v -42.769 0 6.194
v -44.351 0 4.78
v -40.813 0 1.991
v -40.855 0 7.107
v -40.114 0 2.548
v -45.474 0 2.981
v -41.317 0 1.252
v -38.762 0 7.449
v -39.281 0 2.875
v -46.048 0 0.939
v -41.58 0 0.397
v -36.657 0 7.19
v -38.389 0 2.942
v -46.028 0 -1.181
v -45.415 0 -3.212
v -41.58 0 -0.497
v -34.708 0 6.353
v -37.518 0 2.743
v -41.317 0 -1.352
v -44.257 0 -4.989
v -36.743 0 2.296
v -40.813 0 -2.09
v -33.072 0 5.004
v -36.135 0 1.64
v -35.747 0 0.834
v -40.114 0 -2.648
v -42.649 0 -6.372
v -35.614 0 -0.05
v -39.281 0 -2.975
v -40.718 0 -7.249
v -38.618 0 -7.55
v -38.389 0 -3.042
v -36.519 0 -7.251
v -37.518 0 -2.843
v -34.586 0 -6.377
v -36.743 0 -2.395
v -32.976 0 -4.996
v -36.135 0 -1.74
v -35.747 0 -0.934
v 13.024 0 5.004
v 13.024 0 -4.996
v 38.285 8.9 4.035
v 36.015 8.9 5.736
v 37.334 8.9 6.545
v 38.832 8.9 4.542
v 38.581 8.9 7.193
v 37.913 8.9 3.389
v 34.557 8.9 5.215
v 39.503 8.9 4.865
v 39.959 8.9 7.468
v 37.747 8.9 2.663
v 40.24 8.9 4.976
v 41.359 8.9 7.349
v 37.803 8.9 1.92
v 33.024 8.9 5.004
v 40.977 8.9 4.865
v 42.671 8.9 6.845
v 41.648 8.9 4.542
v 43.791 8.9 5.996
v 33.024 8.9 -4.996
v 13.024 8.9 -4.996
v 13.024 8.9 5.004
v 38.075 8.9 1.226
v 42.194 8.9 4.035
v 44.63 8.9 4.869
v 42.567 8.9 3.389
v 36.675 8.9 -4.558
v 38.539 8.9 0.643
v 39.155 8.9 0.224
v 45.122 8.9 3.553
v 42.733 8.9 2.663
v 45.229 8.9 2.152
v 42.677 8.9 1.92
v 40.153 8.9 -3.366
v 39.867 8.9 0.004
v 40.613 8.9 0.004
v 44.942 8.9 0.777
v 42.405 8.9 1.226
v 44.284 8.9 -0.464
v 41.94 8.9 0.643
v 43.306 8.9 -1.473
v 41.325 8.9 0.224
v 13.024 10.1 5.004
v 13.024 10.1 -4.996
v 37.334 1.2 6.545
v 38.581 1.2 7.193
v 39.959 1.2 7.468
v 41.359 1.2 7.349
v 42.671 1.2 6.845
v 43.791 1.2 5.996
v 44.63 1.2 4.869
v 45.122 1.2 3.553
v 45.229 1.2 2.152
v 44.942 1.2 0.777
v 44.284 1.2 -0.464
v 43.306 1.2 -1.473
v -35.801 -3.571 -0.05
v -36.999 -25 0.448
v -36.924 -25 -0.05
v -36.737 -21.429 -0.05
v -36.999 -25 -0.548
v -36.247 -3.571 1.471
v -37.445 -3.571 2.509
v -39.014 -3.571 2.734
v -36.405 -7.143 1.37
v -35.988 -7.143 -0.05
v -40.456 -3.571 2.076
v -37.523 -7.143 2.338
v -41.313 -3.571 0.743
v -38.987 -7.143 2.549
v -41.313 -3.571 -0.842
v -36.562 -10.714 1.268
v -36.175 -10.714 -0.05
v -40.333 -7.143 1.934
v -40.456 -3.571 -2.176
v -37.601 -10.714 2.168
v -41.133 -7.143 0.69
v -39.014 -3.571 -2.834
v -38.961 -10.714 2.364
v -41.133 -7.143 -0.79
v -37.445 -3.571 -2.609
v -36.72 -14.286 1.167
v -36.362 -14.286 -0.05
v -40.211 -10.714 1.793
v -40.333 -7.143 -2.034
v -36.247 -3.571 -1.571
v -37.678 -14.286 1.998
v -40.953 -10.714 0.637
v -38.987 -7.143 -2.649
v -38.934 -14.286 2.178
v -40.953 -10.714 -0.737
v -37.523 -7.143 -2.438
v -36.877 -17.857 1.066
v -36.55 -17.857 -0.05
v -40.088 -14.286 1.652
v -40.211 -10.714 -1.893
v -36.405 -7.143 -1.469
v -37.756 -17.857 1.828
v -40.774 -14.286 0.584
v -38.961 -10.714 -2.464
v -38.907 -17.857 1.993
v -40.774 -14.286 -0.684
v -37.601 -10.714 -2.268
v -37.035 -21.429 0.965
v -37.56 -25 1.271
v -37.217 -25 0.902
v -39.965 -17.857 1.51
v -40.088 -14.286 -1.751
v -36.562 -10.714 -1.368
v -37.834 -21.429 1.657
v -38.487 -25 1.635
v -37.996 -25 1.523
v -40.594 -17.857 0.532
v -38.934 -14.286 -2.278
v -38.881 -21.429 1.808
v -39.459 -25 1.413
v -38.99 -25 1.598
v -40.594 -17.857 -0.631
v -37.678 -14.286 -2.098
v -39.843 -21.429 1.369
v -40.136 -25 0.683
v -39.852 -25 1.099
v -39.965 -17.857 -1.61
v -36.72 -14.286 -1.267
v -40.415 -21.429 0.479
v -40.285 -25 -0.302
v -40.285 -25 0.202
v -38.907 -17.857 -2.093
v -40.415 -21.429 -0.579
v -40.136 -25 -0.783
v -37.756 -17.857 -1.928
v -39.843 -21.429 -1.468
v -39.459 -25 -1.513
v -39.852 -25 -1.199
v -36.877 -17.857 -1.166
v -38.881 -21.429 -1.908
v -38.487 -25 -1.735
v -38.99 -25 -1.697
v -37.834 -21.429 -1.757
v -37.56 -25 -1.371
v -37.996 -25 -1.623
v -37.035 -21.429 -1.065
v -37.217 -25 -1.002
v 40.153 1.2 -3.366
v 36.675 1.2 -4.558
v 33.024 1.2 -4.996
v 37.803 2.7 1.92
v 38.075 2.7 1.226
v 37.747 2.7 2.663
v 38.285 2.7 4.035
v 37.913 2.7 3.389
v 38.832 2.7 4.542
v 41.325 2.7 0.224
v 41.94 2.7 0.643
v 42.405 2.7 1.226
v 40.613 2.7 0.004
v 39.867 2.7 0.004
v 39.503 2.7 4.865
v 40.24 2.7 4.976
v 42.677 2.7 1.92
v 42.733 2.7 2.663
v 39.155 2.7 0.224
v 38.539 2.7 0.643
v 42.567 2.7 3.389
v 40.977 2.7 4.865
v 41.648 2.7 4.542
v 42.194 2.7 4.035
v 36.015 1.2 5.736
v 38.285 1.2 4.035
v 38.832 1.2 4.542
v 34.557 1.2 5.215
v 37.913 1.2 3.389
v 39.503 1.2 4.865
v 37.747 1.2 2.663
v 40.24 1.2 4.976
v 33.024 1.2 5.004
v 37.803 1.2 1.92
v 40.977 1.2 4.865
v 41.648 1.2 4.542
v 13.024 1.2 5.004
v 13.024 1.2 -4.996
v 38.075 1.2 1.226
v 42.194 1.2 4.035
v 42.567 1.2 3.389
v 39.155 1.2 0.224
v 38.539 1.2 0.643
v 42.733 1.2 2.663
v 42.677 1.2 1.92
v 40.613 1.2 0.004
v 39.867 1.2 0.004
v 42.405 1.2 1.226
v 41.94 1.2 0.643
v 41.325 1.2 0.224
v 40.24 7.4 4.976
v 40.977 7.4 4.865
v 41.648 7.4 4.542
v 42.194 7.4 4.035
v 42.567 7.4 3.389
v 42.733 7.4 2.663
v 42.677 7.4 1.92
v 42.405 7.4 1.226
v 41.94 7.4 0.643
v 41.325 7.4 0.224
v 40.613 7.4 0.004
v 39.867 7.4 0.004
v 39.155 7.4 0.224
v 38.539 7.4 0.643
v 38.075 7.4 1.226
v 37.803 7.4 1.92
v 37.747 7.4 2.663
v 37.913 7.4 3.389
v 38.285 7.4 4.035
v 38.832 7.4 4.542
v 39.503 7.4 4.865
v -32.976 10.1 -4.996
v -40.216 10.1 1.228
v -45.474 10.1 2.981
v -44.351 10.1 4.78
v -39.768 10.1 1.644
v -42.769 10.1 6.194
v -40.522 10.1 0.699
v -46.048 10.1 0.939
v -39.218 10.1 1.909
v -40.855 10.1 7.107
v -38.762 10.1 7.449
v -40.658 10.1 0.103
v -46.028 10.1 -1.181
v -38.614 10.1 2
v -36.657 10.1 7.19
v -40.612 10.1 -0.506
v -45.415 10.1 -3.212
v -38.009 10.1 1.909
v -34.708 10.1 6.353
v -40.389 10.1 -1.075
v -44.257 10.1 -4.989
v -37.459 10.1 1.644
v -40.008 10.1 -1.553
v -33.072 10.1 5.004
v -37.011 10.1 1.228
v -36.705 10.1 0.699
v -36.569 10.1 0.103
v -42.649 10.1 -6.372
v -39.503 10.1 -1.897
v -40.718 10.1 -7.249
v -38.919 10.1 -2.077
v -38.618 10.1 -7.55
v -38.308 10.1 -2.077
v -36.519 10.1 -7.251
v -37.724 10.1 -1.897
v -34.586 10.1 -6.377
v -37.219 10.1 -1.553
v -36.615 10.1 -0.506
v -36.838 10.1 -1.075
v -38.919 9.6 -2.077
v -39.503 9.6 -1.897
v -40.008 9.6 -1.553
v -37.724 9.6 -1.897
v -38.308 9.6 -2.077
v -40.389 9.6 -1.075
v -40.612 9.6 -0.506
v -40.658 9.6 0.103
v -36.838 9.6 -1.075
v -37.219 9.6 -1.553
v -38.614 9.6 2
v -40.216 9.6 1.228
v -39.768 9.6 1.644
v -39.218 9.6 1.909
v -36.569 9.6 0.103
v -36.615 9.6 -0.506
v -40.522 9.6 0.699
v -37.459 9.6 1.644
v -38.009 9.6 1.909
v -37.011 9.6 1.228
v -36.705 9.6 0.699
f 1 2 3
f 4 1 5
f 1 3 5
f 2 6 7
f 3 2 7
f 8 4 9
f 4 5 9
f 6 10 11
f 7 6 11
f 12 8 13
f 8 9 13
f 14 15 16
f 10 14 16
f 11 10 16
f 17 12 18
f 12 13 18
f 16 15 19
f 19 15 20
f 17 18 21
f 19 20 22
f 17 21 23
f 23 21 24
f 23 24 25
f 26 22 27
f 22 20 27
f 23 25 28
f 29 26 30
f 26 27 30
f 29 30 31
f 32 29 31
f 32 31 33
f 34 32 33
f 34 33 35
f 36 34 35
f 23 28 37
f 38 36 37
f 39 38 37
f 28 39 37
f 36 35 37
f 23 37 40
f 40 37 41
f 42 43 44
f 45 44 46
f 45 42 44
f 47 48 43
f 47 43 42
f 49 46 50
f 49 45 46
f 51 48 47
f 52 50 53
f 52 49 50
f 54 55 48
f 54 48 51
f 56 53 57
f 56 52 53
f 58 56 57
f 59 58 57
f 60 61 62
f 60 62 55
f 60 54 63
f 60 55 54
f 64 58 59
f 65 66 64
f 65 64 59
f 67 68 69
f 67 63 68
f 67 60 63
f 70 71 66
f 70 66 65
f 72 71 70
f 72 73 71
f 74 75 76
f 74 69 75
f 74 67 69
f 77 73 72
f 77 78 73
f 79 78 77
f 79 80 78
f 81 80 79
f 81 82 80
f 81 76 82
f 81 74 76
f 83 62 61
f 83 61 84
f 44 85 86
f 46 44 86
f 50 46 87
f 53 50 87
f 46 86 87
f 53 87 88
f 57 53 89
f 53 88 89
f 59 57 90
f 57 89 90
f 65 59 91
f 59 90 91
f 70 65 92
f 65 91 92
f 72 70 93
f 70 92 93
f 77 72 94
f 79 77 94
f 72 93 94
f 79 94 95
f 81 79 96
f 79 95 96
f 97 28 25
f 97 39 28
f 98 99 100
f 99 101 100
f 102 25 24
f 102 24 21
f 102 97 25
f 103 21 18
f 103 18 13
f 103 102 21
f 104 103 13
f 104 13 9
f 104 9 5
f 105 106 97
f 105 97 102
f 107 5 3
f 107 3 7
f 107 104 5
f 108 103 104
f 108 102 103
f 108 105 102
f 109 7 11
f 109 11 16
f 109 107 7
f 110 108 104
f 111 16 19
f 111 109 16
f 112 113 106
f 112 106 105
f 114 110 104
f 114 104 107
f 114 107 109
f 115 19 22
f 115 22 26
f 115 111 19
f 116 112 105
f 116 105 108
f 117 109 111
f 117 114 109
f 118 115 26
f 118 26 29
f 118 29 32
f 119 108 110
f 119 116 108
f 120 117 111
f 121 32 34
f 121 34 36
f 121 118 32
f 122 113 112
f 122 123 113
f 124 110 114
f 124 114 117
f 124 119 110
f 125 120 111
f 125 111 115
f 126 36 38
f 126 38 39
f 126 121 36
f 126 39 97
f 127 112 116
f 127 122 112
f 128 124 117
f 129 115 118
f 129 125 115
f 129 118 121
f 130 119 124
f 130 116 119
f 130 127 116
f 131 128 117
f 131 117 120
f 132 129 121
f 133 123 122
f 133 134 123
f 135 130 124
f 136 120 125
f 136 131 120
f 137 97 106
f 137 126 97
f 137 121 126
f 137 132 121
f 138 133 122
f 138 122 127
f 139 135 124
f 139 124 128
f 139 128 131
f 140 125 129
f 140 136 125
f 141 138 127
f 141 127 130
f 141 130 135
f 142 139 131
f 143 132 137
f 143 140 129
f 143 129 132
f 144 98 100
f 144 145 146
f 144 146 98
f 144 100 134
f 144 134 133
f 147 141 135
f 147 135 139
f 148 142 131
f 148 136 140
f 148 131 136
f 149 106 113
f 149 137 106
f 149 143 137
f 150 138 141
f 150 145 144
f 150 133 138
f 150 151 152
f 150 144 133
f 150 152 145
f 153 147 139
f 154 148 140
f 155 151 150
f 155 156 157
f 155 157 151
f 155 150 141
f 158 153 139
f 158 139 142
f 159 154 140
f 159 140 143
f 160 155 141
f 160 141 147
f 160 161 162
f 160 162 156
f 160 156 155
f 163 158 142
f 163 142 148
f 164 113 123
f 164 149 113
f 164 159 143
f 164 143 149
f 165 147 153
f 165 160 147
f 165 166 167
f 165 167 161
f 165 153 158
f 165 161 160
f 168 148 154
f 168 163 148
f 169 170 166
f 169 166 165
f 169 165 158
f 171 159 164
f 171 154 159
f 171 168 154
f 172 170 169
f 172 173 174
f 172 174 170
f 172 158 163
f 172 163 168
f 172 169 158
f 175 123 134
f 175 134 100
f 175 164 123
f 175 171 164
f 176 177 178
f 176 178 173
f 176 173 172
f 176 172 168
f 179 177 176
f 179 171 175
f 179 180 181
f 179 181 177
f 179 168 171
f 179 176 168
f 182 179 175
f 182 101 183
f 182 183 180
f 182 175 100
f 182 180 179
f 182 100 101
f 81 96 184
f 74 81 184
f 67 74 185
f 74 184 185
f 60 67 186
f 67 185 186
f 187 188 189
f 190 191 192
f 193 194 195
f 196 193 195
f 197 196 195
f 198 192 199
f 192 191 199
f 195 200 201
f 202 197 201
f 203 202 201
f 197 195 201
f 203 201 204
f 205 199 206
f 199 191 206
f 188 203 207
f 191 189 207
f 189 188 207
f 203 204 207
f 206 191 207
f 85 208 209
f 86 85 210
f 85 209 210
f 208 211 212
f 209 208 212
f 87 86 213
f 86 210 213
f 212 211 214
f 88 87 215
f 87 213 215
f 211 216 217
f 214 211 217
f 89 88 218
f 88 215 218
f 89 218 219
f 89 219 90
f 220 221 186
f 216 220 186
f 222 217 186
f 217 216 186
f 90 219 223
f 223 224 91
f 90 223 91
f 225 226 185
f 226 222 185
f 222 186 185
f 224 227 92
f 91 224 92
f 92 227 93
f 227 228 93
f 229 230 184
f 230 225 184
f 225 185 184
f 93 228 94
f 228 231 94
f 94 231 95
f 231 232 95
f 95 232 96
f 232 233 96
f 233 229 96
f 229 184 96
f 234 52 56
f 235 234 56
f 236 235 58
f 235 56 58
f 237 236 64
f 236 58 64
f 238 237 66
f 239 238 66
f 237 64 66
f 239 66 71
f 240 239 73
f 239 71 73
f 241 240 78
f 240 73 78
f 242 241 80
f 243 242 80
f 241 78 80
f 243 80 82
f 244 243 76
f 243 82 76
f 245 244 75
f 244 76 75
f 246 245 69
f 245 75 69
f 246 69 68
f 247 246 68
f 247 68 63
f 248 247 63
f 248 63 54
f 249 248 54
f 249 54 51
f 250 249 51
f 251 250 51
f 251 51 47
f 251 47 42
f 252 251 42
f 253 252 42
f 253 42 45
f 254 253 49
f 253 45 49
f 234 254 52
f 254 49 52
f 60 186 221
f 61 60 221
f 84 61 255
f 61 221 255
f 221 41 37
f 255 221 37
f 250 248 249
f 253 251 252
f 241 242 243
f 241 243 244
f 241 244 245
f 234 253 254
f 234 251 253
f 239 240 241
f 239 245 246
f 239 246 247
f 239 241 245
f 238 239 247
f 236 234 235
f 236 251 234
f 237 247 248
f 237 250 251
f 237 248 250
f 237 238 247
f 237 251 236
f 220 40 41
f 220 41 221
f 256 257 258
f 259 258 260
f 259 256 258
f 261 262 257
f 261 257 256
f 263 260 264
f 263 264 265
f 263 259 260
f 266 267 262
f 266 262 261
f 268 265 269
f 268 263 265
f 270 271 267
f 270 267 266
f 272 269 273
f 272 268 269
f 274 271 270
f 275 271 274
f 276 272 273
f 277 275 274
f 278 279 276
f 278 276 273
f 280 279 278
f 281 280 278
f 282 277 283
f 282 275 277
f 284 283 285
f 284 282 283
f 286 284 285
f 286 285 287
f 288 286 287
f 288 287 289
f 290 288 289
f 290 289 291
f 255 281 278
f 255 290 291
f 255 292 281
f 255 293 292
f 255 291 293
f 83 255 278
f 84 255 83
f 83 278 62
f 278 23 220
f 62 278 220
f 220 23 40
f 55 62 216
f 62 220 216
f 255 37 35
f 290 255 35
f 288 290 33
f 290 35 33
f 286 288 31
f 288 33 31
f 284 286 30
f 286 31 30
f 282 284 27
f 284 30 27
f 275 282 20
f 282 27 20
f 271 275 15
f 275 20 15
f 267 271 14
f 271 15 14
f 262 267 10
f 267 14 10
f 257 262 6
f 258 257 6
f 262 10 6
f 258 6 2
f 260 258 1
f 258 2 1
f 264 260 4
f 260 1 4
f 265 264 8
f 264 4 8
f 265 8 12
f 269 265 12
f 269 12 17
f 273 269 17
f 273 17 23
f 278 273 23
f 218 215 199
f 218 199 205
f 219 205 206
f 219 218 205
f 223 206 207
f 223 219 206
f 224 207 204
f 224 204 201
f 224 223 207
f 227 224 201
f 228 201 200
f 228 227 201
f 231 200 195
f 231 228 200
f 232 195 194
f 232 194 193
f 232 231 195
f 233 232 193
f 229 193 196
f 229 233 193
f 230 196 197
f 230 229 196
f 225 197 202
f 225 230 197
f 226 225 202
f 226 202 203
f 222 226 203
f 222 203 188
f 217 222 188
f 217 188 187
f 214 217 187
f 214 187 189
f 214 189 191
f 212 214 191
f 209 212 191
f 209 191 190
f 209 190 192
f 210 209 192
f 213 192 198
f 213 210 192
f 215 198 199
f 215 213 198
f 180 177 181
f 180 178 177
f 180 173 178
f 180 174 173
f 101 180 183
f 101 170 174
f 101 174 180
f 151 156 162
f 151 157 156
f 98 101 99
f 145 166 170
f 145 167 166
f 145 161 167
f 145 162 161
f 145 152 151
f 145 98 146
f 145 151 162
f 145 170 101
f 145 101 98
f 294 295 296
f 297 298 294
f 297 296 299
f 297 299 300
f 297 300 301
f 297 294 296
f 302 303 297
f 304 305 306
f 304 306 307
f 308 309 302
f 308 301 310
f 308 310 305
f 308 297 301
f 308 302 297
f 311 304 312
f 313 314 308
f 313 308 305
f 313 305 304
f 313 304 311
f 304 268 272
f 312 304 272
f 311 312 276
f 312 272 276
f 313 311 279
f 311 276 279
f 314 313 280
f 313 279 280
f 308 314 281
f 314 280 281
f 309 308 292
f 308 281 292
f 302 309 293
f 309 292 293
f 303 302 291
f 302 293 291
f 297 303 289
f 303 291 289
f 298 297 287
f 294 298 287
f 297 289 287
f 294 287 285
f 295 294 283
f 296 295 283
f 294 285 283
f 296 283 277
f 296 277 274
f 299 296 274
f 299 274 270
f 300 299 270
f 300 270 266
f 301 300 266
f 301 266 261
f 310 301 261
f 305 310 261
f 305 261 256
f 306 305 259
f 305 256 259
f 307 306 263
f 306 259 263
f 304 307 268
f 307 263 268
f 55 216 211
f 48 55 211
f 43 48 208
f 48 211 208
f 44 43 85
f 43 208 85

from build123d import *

# Parameters (mm, degrees)
SALIENTE_EXTRUIR1_DEPTH = 10.1
CROQUIS7_R              = 2.05
CORTAR_EXTRUIR1_DEPTH   = 0.5
CROQUIS11_W             = 20
CROQUIS11_H             = 1.2
CORTAR_EXTRUIR4_DEPTH   = 49.847437401
SALIENTE_EXTRUIR4_START = -7.7
SALIENTE_EXTRUIR4_DEPTH = 7.7
CROQUIS13_R             = 2.5
CORTAR_EXTRUIR5_DEPTH   = 1.5
CROQUIS14_R             = 3
SALIENTE_EXTRUIR5_DEPTH = 25
SALIENTE_EXTRUIR5_TAPER = 3


with BuildPart() as part:
    # Croquis1 → Saliente-Extruir1 (new body)
    with BuildSketch(Plane(origin=(0, 0, 0), x_dir=(1, 0, 0), z_dir=(0, 1, 0))):
        with BuildLine():
            Line((-33.071856209, -5.003625594), (33.023928918, -5.003625594))
            Line((33.023928918, -5.003625594), (33.023928918, 4.996374406))
            Line((33.023928918, 4.996374406), (-32.976071082, 4.996374406))
            ThreePointArc((-32.976071082, 4.996374406), (-46.113327984, 0.121751049), (-33.071856209, -5.003625594))
        make_face()
    extrude(amount=SALIENTE_EXTRUIR1_DEPTH)

    # Croquis7 → Cortar-Extruir1 (cut)
    with BuildSketch(Plane(origin=(0, 10.1, 0), x_dir=(1, 0, 0), z_dir=(0, 1, 0))):
        with Locations(Location((-38.613672015, 0.049915499, 0), (0, 0, 270))):
            Circle(CROQUIS7_R)
    extrude(amount=-CORTAR_EXTRUIR1_DEPTH, mode=Mode.SUBTRACT)

    # Croquis11 → Cortar-Extruir4 (cut, through all)
    with BuildSketch(Plane.XY.offset(5.003625594)):
        with Locations((23.023928918, 9.5)):
            Rectangle(CROQUIS11_W, CROQUIS11_H)
        with Locations((23.023928918, 0.6)):
            Rectangle(CROQUIS11_W, CROQUIS11_H)
    extrude(amount=-CORTAR_EXTRUIR4_DEPTH, mode=Mode.SUBTRACT)

    # Croquis12 → Saliente-Extruir4 (add)
    with BuildSketch(Plane(origin=(0, 8.9, 0), x_dir=(1, 0, 0), z_dir=(0, 1, 0)).offset(SALIENTE_EXTRUIR4_START)):
        with BuildLine():
            Line((33.023928918, 4.996374406), (33.023928918, -5.003625594))
            ThreePointArc((33.023928918, -5.003625594), (35.299630193, -5.437603932), (37.334427549, -6.54519285))
            ThreePointArc((37.334427549, -6.54519285), (44.24999745, -5.462503991), (43.306208076, 1.473387001))
            ThreePointArc((43.306208076, 1.473387001), (38.445512688, 4.053392135), (33.023928918, 4.996374406))
        make_face()
    extrude(amount=SALIENTE_EXTRUIR4_DEPTH)

    # Croquis13 → Cortar-Extruir5 (cut)
    with BuildSketch(Plane(origin=(0, 8.9, 0), x_dir=(1, 0, 0), z_dir=(0, 1, 0))):
        with Locations(Location((40.239901123, -2.476013165, 0), (0, 0, 270))):
            Circle(CROQUIS13_R)
    cortar_extruir5 = extrude(amount=-CORTAR_EXTRUIR5_DEPTH, mode=Mode.SUBTRACT)

    # Croquis14 → Saliente-Extruir5 (add)
    with BuildSketch(Plane.XZ):
        with Locations((-38.613672015, -0.049915499)):
            Circle(CROQUIS14_R)
    extrude(amount=SALIENTE_EXTRUIR5_DEPTH, taper=SALIENTE_EXTRUIR5_TAPER)

    # Simetría1: Cortar-Extruir5 across plane
    add(cortar_extruir5.mirror(Plane.ZX.offset(5.05)), mode=Mode.SUBTRACT)


solid = part.part
